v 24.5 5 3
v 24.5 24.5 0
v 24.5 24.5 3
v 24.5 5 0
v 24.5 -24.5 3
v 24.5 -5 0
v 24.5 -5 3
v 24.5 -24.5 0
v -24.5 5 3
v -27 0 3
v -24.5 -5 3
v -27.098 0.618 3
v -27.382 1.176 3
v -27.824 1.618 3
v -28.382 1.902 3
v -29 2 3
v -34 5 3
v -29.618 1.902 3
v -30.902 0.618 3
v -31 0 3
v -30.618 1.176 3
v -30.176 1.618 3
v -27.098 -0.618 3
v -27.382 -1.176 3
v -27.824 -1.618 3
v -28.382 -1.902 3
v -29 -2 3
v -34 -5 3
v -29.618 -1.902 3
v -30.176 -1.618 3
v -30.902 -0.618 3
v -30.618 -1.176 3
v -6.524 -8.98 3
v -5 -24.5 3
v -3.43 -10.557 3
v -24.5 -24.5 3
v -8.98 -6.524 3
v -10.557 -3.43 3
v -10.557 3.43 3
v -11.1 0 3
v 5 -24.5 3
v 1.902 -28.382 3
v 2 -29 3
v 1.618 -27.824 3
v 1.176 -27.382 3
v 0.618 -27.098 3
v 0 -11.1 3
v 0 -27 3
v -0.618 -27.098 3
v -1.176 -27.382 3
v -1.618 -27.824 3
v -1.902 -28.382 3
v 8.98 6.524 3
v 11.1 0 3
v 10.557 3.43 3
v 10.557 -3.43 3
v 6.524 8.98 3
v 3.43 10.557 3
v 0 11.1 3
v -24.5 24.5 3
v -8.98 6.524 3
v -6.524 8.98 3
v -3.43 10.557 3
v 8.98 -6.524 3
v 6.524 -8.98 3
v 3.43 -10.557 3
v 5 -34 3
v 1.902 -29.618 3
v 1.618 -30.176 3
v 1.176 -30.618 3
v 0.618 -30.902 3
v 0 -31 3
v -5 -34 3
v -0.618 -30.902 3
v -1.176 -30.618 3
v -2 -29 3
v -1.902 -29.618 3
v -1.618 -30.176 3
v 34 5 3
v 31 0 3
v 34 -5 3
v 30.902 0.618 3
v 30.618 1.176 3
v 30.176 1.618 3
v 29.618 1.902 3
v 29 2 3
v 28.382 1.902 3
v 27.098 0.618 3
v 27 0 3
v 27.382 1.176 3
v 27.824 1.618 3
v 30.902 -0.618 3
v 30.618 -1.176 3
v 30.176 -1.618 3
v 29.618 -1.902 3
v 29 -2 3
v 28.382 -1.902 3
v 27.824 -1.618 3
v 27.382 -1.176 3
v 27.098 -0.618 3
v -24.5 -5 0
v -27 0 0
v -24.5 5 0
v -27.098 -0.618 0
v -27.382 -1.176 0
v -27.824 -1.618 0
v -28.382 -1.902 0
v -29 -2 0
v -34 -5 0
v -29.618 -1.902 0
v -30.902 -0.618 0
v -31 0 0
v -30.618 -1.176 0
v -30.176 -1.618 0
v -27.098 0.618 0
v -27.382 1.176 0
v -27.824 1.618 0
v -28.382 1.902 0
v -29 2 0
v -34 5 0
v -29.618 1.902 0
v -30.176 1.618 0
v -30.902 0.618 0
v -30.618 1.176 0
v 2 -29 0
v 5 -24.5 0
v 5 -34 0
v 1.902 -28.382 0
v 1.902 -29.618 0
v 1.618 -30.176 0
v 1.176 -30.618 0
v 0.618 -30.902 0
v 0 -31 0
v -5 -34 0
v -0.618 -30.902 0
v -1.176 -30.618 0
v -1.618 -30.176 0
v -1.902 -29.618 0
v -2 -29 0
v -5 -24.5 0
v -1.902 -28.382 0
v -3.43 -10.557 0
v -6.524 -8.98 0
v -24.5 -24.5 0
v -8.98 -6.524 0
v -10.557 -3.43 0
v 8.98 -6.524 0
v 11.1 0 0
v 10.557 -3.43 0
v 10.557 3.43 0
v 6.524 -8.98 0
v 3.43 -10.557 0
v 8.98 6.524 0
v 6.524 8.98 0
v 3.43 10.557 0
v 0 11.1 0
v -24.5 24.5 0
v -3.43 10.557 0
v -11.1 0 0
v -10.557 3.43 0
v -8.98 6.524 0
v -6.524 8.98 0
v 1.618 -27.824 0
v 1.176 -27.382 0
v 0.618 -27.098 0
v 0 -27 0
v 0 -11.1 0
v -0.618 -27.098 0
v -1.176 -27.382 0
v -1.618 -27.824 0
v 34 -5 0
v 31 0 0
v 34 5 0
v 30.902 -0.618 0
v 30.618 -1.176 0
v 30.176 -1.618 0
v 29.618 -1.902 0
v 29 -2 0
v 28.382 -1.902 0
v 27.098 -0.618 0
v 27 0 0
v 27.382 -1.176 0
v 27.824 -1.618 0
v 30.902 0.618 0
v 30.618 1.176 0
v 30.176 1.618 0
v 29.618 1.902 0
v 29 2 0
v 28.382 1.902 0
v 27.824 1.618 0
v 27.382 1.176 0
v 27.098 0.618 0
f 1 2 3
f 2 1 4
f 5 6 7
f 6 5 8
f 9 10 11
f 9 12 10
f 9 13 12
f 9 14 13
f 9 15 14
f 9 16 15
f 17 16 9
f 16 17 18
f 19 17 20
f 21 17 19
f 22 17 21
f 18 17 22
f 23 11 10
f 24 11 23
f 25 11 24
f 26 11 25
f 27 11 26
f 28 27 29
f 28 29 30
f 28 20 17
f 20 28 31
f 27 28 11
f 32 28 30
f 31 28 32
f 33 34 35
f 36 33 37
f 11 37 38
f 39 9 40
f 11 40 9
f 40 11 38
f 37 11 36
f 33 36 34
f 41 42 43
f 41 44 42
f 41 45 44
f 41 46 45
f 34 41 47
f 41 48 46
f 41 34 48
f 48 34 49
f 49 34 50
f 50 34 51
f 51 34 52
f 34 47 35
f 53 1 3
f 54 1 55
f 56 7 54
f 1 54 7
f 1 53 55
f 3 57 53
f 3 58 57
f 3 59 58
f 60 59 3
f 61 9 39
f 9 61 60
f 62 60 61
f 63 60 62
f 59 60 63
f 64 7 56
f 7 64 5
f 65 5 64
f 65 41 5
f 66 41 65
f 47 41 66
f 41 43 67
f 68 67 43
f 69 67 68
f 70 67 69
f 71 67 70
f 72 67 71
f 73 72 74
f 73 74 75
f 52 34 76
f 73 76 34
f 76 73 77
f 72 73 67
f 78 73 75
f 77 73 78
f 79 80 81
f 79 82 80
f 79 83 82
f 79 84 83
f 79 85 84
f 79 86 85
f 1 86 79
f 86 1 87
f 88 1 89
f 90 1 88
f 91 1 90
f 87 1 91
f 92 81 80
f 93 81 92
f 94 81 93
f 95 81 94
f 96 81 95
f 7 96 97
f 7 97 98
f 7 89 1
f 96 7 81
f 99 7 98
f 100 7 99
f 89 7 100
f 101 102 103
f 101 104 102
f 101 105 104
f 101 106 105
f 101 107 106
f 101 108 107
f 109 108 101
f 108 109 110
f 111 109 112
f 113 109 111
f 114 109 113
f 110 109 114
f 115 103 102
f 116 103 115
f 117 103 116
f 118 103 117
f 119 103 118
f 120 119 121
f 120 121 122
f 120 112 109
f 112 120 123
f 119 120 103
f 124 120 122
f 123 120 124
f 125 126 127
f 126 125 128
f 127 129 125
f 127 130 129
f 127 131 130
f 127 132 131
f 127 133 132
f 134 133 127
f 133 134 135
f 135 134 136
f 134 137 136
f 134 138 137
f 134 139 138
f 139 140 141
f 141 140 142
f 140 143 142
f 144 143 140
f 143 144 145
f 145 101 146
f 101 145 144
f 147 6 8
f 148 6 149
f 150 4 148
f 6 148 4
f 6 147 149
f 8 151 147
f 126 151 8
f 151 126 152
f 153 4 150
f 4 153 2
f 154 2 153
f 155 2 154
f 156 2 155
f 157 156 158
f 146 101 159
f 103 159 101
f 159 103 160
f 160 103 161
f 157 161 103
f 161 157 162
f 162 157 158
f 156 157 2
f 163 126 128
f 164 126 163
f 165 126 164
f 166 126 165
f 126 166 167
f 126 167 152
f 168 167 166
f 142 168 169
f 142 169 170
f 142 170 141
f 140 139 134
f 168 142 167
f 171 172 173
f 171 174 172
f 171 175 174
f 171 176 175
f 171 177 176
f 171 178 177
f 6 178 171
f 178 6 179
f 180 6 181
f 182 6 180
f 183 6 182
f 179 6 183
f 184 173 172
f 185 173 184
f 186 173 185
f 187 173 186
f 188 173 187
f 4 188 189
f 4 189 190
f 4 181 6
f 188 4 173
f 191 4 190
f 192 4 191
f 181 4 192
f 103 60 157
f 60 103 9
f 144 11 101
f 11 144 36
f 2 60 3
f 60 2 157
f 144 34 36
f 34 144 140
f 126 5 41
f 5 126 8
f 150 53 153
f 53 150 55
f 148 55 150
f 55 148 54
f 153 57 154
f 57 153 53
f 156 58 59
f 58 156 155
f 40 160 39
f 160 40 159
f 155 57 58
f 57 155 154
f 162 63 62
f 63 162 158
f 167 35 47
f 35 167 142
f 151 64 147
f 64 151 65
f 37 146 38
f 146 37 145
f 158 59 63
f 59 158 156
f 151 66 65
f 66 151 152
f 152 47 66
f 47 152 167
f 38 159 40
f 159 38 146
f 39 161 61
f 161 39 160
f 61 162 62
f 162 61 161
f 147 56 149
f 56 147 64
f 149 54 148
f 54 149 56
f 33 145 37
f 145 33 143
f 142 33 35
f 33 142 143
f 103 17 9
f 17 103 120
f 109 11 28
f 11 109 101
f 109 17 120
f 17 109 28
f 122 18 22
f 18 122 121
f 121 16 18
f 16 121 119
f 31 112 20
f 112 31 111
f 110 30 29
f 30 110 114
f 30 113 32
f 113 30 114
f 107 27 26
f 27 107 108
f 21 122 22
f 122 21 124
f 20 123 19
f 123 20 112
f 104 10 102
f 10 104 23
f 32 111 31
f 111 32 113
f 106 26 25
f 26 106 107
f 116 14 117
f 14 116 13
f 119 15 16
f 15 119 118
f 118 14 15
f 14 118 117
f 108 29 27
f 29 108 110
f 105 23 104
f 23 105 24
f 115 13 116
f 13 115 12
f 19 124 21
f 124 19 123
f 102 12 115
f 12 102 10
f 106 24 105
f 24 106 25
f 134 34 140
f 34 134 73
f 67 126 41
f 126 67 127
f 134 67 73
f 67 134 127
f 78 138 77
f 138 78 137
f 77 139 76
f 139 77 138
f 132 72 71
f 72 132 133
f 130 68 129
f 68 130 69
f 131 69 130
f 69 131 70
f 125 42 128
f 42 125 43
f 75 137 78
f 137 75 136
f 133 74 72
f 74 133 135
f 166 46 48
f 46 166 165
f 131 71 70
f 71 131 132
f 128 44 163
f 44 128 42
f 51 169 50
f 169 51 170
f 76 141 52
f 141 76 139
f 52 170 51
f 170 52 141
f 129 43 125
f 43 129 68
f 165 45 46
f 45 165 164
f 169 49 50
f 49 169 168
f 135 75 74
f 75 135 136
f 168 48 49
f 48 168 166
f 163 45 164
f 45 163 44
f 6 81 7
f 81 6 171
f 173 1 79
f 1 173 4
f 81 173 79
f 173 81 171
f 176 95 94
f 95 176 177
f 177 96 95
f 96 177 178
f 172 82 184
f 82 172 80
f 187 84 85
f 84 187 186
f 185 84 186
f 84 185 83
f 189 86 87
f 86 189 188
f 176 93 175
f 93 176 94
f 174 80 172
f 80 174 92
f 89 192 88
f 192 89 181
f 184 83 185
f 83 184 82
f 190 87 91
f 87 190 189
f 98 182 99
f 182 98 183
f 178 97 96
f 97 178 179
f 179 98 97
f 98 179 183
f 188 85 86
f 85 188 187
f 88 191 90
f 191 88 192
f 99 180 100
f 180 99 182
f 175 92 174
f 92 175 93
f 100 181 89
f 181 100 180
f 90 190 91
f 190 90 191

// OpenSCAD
$fn = 20;
plaque();

module plaque() {
	union() {
		difference() {
			translate([-24.5, -24.5, 0]) cube([49, 49, 3]);
			cylinder(h = 10, r = 11.1, center = true);
		}
		for (i = [1 : 3]) {
			rotate([0, 0, i * 90]) translate([-5, 24, 0]) {
				difference() {
					cube([10, 10, 3]);
					translate([5, 5, 0]) cylinder(h = 20, r = 2, center = true); 
				}
			}
		}
	}
}
